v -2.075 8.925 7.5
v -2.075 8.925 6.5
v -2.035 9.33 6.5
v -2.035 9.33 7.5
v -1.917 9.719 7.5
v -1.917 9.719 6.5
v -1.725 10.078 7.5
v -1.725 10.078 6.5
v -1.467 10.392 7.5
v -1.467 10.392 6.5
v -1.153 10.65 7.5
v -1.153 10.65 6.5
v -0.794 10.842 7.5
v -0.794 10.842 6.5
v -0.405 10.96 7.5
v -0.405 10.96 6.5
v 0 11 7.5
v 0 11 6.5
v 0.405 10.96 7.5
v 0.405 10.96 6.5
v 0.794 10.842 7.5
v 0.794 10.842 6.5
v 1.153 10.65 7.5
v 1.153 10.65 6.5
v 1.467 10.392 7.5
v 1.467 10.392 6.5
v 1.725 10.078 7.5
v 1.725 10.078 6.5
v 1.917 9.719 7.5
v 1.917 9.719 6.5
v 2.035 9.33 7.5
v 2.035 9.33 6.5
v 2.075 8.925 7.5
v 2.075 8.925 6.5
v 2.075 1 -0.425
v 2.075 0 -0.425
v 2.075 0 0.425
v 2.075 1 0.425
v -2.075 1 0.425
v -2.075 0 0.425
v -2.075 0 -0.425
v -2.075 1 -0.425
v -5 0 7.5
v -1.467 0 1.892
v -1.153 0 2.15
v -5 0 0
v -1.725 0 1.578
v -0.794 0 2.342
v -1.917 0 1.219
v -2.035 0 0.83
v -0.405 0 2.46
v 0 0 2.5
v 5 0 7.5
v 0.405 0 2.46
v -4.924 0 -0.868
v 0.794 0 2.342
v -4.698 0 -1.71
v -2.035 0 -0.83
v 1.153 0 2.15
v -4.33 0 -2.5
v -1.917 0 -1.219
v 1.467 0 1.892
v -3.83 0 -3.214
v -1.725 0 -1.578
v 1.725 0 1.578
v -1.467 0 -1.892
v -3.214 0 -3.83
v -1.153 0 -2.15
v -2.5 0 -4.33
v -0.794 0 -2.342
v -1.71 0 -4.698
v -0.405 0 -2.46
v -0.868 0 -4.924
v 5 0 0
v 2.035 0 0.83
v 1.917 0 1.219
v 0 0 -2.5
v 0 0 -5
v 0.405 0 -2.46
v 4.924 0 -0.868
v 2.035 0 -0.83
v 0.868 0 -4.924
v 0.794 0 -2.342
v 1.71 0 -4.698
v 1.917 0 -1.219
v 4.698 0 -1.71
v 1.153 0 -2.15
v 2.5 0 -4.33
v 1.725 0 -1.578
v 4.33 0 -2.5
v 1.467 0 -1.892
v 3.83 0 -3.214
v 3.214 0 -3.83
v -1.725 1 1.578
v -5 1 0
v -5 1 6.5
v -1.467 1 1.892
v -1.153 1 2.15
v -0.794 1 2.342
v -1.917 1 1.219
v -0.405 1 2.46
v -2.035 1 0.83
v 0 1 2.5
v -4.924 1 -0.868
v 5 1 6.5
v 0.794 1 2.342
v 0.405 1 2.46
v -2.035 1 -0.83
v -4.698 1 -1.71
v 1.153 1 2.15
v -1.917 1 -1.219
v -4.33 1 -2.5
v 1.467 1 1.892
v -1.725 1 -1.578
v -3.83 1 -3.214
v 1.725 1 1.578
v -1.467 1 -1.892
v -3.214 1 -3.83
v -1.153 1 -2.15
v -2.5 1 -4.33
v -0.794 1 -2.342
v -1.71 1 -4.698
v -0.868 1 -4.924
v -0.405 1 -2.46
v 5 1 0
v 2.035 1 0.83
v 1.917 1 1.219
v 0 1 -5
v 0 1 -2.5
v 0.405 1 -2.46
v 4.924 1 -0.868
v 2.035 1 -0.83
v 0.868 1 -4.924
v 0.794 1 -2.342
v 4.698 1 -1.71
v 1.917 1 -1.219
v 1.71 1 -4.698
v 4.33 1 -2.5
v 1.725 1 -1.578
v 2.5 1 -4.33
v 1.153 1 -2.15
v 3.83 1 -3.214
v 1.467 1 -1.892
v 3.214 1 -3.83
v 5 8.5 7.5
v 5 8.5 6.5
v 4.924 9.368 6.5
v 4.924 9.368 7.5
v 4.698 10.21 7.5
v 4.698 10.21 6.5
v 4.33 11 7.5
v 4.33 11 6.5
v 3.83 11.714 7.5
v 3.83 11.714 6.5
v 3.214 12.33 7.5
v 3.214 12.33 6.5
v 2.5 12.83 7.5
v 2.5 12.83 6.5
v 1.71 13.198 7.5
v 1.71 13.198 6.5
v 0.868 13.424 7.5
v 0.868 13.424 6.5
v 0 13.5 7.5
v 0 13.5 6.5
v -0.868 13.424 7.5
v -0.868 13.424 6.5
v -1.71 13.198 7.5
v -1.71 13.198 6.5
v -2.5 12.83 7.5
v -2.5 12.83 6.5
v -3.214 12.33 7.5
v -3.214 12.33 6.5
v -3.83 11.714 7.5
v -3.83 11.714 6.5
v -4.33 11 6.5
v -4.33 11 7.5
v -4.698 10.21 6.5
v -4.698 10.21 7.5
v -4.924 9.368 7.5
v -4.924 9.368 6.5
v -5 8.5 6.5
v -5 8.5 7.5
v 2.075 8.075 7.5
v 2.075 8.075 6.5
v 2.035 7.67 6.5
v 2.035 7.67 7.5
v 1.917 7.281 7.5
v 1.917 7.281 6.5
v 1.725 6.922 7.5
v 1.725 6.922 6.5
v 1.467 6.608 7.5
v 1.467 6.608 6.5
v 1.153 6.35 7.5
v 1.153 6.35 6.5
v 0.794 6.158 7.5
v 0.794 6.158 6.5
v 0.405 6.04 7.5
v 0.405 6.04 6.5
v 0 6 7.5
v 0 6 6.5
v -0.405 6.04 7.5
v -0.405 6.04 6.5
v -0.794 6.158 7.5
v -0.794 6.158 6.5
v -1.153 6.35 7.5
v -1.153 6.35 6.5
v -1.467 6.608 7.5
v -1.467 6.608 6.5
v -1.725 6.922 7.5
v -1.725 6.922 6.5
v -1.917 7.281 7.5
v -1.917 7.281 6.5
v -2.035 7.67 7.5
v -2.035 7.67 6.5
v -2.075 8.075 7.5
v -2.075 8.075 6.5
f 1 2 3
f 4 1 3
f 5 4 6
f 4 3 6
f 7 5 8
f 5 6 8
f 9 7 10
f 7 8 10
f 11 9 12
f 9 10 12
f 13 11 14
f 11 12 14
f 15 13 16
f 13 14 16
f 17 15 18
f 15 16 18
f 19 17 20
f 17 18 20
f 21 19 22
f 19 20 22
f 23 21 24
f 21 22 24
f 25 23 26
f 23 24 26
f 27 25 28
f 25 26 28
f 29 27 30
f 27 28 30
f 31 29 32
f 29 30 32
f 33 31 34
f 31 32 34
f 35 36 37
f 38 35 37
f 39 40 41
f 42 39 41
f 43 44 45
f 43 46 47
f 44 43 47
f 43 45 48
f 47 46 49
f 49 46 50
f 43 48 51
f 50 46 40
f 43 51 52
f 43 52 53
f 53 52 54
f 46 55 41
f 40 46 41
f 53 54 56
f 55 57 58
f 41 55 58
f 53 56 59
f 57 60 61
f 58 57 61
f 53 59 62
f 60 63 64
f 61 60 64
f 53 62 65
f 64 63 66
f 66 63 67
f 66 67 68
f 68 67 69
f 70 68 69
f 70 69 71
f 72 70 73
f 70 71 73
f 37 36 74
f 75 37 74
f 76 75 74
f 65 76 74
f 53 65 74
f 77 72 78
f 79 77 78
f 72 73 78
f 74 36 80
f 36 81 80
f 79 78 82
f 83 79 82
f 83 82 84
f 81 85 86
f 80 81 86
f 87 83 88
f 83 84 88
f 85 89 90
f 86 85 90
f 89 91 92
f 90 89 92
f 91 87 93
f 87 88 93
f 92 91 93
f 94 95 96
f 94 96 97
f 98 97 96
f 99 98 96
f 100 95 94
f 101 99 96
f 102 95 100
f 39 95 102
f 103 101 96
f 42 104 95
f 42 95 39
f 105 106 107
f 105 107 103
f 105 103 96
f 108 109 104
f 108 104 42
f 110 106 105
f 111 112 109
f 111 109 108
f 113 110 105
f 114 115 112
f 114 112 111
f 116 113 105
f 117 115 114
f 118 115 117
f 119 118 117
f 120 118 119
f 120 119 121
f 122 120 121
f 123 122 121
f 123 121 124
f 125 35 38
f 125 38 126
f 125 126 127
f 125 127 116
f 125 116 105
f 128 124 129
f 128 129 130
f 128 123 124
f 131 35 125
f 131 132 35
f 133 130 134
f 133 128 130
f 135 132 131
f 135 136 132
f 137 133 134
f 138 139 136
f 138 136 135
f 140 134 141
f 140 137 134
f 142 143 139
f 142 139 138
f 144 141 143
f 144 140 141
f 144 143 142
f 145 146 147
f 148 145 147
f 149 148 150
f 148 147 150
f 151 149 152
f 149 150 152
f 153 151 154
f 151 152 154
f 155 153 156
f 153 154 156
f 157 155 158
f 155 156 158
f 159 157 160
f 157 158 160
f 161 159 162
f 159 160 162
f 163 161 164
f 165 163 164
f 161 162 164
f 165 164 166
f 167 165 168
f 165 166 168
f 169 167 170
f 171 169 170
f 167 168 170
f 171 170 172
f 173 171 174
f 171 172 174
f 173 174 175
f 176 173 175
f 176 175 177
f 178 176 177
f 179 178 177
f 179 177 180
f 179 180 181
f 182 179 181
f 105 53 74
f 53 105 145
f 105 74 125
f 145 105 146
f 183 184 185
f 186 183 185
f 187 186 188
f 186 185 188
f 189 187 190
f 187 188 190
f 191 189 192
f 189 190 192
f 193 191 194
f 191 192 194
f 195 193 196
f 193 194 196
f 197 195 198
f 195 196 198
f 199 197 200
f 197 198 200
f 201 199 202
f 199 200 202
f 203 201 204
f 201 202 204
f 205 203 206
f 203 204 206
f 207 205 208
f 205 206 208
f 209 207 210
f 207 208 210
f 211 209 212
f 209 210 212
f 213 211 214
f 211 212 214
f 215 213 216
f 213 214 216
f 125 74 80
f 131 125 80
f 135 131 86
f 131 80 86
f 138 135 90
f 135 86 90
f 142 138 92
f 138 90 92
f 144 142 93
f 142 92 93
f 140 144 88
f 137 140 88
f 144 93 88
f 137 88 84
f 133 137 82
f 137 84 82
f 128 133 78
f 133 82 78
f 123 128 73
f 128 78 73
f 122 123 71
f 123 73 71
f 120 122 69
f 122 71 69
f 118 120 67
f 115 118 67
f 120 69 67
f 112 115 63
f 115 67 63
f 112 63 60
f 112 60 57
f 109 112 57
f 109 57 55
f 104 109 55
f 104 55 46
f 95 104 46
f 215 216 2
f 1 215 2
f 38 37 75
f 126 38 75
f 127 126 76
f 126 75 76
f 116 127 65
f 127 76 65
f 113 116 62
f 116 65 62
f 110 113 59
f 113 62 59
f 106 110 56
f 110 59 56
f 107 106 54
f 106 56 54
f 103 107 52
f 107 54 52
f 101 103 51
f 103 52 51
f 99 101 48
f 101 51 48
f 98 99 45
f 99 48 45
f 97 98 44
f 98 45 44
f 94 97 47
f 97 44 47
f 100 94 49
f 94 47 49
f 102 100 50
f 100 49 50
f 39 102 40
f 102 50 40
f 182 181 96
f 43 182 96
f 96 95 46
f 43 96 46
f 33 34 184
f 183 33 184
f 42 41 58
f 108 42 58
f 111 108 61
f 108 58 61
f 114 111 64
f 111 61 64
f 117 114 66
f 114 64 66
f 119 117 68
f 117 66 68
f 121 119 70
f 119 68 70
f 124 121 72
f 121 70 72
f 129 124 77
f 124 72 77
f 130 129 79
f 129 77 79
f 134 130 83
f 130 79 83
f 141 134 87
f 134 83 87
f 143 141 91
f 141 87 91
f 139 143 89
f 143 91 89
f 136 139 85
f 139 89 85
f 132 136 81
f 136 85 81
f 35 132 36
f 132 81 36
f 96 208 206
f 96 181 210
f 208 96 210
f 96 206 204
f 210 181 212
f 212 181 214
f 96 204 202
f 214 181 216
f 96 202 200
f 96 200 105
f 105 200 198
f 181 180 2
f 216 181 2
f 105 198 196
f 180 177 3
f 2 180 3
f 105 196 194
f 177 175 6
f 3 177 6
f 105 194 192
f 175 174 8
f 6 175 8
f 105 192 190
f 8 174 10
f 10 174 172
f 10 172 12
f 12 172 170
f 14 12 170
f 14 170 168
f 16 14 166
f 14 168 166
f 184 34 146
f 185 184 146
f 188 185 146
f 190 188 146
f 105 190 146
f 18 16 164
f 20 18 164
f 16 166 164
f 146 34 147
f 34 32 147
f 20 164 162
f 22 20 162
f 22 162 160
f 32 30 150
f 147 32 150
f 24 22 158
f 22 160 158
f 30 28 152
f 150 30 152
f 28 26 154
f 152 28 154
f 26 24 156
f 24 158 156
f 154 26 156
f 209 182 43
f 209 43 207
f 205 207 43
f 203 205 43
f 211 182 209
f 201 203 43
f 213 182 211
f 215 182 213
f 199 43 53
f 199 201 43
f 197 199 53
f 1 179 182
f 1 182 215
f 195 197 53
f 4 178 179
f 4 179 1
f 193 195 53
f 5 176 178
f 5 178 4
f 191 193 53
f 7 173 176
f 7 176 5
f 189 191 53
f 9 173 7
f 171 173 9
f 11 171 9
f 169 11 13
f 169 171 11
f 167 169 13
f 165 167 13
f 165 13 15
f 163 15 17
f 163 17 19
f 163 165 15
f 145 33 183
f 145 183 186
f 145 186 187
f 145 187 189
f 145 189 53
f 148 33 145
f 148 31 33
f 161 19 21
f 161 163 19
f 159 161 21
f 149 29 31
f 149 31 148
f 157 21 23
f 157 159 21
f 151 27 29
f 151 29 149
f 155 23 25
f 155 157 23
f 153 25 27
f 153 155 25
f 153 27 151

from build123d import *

# Parameters (mm, degrees)
BOSS_EXTRUDE1_DEPTH = 1
CIRPATTERN1_COUNT   = 2
CIRPATTERN1_ANGLE   = 90


with BuildPart() as part:
    # Sketch2 → Boss-Extrude1 (new body)
    with BuildSketch(Plane(origin=(0, 0, 0), x_dir=(1, 0, 0), z_dir=(0, 1, 0))):
        with BuildLine():
            Line((-5, 0), (-5, -7.5))
            Line((-5, -7.5), (5, -7.5))
            Line((5, -7.5), (5, 0))
            ThreePointArc((5, 0), (0, 5), (-5, 0))
        make_face()
        with BuildLine():
            Line((2.075, 0.425), (2.075, -0.425))
            ThreePointArc((2.075, -0.425), (0, -2.5), (-2.075, -0.425))
            Line((-2.075, -0.425), (-2.075, 0.425))
            ThreePointArc((-2.075, 0.425), (0, 2.5), (2.075, 0.425))
        make_face(mode=Mode.SUBTRACT)
    boss_extrude1 = extrude(amount=BOSS_EXTRUDE1_DEPTH)

    # CirPattern1: Boss-Extrude1 ×2 about axis
    cirpattern1_axis = Axis((-5, 1, 7.5), (1, 0, 0))
    for i in range(1, CIRPATTERN1_COUNT):
        add(boss_extrude1.rotate(cirpattern1_axis, i * CIRPATTERN1_ANGLE / (CIRPATTERN1_COUNT - 1)))


solid = part.part
